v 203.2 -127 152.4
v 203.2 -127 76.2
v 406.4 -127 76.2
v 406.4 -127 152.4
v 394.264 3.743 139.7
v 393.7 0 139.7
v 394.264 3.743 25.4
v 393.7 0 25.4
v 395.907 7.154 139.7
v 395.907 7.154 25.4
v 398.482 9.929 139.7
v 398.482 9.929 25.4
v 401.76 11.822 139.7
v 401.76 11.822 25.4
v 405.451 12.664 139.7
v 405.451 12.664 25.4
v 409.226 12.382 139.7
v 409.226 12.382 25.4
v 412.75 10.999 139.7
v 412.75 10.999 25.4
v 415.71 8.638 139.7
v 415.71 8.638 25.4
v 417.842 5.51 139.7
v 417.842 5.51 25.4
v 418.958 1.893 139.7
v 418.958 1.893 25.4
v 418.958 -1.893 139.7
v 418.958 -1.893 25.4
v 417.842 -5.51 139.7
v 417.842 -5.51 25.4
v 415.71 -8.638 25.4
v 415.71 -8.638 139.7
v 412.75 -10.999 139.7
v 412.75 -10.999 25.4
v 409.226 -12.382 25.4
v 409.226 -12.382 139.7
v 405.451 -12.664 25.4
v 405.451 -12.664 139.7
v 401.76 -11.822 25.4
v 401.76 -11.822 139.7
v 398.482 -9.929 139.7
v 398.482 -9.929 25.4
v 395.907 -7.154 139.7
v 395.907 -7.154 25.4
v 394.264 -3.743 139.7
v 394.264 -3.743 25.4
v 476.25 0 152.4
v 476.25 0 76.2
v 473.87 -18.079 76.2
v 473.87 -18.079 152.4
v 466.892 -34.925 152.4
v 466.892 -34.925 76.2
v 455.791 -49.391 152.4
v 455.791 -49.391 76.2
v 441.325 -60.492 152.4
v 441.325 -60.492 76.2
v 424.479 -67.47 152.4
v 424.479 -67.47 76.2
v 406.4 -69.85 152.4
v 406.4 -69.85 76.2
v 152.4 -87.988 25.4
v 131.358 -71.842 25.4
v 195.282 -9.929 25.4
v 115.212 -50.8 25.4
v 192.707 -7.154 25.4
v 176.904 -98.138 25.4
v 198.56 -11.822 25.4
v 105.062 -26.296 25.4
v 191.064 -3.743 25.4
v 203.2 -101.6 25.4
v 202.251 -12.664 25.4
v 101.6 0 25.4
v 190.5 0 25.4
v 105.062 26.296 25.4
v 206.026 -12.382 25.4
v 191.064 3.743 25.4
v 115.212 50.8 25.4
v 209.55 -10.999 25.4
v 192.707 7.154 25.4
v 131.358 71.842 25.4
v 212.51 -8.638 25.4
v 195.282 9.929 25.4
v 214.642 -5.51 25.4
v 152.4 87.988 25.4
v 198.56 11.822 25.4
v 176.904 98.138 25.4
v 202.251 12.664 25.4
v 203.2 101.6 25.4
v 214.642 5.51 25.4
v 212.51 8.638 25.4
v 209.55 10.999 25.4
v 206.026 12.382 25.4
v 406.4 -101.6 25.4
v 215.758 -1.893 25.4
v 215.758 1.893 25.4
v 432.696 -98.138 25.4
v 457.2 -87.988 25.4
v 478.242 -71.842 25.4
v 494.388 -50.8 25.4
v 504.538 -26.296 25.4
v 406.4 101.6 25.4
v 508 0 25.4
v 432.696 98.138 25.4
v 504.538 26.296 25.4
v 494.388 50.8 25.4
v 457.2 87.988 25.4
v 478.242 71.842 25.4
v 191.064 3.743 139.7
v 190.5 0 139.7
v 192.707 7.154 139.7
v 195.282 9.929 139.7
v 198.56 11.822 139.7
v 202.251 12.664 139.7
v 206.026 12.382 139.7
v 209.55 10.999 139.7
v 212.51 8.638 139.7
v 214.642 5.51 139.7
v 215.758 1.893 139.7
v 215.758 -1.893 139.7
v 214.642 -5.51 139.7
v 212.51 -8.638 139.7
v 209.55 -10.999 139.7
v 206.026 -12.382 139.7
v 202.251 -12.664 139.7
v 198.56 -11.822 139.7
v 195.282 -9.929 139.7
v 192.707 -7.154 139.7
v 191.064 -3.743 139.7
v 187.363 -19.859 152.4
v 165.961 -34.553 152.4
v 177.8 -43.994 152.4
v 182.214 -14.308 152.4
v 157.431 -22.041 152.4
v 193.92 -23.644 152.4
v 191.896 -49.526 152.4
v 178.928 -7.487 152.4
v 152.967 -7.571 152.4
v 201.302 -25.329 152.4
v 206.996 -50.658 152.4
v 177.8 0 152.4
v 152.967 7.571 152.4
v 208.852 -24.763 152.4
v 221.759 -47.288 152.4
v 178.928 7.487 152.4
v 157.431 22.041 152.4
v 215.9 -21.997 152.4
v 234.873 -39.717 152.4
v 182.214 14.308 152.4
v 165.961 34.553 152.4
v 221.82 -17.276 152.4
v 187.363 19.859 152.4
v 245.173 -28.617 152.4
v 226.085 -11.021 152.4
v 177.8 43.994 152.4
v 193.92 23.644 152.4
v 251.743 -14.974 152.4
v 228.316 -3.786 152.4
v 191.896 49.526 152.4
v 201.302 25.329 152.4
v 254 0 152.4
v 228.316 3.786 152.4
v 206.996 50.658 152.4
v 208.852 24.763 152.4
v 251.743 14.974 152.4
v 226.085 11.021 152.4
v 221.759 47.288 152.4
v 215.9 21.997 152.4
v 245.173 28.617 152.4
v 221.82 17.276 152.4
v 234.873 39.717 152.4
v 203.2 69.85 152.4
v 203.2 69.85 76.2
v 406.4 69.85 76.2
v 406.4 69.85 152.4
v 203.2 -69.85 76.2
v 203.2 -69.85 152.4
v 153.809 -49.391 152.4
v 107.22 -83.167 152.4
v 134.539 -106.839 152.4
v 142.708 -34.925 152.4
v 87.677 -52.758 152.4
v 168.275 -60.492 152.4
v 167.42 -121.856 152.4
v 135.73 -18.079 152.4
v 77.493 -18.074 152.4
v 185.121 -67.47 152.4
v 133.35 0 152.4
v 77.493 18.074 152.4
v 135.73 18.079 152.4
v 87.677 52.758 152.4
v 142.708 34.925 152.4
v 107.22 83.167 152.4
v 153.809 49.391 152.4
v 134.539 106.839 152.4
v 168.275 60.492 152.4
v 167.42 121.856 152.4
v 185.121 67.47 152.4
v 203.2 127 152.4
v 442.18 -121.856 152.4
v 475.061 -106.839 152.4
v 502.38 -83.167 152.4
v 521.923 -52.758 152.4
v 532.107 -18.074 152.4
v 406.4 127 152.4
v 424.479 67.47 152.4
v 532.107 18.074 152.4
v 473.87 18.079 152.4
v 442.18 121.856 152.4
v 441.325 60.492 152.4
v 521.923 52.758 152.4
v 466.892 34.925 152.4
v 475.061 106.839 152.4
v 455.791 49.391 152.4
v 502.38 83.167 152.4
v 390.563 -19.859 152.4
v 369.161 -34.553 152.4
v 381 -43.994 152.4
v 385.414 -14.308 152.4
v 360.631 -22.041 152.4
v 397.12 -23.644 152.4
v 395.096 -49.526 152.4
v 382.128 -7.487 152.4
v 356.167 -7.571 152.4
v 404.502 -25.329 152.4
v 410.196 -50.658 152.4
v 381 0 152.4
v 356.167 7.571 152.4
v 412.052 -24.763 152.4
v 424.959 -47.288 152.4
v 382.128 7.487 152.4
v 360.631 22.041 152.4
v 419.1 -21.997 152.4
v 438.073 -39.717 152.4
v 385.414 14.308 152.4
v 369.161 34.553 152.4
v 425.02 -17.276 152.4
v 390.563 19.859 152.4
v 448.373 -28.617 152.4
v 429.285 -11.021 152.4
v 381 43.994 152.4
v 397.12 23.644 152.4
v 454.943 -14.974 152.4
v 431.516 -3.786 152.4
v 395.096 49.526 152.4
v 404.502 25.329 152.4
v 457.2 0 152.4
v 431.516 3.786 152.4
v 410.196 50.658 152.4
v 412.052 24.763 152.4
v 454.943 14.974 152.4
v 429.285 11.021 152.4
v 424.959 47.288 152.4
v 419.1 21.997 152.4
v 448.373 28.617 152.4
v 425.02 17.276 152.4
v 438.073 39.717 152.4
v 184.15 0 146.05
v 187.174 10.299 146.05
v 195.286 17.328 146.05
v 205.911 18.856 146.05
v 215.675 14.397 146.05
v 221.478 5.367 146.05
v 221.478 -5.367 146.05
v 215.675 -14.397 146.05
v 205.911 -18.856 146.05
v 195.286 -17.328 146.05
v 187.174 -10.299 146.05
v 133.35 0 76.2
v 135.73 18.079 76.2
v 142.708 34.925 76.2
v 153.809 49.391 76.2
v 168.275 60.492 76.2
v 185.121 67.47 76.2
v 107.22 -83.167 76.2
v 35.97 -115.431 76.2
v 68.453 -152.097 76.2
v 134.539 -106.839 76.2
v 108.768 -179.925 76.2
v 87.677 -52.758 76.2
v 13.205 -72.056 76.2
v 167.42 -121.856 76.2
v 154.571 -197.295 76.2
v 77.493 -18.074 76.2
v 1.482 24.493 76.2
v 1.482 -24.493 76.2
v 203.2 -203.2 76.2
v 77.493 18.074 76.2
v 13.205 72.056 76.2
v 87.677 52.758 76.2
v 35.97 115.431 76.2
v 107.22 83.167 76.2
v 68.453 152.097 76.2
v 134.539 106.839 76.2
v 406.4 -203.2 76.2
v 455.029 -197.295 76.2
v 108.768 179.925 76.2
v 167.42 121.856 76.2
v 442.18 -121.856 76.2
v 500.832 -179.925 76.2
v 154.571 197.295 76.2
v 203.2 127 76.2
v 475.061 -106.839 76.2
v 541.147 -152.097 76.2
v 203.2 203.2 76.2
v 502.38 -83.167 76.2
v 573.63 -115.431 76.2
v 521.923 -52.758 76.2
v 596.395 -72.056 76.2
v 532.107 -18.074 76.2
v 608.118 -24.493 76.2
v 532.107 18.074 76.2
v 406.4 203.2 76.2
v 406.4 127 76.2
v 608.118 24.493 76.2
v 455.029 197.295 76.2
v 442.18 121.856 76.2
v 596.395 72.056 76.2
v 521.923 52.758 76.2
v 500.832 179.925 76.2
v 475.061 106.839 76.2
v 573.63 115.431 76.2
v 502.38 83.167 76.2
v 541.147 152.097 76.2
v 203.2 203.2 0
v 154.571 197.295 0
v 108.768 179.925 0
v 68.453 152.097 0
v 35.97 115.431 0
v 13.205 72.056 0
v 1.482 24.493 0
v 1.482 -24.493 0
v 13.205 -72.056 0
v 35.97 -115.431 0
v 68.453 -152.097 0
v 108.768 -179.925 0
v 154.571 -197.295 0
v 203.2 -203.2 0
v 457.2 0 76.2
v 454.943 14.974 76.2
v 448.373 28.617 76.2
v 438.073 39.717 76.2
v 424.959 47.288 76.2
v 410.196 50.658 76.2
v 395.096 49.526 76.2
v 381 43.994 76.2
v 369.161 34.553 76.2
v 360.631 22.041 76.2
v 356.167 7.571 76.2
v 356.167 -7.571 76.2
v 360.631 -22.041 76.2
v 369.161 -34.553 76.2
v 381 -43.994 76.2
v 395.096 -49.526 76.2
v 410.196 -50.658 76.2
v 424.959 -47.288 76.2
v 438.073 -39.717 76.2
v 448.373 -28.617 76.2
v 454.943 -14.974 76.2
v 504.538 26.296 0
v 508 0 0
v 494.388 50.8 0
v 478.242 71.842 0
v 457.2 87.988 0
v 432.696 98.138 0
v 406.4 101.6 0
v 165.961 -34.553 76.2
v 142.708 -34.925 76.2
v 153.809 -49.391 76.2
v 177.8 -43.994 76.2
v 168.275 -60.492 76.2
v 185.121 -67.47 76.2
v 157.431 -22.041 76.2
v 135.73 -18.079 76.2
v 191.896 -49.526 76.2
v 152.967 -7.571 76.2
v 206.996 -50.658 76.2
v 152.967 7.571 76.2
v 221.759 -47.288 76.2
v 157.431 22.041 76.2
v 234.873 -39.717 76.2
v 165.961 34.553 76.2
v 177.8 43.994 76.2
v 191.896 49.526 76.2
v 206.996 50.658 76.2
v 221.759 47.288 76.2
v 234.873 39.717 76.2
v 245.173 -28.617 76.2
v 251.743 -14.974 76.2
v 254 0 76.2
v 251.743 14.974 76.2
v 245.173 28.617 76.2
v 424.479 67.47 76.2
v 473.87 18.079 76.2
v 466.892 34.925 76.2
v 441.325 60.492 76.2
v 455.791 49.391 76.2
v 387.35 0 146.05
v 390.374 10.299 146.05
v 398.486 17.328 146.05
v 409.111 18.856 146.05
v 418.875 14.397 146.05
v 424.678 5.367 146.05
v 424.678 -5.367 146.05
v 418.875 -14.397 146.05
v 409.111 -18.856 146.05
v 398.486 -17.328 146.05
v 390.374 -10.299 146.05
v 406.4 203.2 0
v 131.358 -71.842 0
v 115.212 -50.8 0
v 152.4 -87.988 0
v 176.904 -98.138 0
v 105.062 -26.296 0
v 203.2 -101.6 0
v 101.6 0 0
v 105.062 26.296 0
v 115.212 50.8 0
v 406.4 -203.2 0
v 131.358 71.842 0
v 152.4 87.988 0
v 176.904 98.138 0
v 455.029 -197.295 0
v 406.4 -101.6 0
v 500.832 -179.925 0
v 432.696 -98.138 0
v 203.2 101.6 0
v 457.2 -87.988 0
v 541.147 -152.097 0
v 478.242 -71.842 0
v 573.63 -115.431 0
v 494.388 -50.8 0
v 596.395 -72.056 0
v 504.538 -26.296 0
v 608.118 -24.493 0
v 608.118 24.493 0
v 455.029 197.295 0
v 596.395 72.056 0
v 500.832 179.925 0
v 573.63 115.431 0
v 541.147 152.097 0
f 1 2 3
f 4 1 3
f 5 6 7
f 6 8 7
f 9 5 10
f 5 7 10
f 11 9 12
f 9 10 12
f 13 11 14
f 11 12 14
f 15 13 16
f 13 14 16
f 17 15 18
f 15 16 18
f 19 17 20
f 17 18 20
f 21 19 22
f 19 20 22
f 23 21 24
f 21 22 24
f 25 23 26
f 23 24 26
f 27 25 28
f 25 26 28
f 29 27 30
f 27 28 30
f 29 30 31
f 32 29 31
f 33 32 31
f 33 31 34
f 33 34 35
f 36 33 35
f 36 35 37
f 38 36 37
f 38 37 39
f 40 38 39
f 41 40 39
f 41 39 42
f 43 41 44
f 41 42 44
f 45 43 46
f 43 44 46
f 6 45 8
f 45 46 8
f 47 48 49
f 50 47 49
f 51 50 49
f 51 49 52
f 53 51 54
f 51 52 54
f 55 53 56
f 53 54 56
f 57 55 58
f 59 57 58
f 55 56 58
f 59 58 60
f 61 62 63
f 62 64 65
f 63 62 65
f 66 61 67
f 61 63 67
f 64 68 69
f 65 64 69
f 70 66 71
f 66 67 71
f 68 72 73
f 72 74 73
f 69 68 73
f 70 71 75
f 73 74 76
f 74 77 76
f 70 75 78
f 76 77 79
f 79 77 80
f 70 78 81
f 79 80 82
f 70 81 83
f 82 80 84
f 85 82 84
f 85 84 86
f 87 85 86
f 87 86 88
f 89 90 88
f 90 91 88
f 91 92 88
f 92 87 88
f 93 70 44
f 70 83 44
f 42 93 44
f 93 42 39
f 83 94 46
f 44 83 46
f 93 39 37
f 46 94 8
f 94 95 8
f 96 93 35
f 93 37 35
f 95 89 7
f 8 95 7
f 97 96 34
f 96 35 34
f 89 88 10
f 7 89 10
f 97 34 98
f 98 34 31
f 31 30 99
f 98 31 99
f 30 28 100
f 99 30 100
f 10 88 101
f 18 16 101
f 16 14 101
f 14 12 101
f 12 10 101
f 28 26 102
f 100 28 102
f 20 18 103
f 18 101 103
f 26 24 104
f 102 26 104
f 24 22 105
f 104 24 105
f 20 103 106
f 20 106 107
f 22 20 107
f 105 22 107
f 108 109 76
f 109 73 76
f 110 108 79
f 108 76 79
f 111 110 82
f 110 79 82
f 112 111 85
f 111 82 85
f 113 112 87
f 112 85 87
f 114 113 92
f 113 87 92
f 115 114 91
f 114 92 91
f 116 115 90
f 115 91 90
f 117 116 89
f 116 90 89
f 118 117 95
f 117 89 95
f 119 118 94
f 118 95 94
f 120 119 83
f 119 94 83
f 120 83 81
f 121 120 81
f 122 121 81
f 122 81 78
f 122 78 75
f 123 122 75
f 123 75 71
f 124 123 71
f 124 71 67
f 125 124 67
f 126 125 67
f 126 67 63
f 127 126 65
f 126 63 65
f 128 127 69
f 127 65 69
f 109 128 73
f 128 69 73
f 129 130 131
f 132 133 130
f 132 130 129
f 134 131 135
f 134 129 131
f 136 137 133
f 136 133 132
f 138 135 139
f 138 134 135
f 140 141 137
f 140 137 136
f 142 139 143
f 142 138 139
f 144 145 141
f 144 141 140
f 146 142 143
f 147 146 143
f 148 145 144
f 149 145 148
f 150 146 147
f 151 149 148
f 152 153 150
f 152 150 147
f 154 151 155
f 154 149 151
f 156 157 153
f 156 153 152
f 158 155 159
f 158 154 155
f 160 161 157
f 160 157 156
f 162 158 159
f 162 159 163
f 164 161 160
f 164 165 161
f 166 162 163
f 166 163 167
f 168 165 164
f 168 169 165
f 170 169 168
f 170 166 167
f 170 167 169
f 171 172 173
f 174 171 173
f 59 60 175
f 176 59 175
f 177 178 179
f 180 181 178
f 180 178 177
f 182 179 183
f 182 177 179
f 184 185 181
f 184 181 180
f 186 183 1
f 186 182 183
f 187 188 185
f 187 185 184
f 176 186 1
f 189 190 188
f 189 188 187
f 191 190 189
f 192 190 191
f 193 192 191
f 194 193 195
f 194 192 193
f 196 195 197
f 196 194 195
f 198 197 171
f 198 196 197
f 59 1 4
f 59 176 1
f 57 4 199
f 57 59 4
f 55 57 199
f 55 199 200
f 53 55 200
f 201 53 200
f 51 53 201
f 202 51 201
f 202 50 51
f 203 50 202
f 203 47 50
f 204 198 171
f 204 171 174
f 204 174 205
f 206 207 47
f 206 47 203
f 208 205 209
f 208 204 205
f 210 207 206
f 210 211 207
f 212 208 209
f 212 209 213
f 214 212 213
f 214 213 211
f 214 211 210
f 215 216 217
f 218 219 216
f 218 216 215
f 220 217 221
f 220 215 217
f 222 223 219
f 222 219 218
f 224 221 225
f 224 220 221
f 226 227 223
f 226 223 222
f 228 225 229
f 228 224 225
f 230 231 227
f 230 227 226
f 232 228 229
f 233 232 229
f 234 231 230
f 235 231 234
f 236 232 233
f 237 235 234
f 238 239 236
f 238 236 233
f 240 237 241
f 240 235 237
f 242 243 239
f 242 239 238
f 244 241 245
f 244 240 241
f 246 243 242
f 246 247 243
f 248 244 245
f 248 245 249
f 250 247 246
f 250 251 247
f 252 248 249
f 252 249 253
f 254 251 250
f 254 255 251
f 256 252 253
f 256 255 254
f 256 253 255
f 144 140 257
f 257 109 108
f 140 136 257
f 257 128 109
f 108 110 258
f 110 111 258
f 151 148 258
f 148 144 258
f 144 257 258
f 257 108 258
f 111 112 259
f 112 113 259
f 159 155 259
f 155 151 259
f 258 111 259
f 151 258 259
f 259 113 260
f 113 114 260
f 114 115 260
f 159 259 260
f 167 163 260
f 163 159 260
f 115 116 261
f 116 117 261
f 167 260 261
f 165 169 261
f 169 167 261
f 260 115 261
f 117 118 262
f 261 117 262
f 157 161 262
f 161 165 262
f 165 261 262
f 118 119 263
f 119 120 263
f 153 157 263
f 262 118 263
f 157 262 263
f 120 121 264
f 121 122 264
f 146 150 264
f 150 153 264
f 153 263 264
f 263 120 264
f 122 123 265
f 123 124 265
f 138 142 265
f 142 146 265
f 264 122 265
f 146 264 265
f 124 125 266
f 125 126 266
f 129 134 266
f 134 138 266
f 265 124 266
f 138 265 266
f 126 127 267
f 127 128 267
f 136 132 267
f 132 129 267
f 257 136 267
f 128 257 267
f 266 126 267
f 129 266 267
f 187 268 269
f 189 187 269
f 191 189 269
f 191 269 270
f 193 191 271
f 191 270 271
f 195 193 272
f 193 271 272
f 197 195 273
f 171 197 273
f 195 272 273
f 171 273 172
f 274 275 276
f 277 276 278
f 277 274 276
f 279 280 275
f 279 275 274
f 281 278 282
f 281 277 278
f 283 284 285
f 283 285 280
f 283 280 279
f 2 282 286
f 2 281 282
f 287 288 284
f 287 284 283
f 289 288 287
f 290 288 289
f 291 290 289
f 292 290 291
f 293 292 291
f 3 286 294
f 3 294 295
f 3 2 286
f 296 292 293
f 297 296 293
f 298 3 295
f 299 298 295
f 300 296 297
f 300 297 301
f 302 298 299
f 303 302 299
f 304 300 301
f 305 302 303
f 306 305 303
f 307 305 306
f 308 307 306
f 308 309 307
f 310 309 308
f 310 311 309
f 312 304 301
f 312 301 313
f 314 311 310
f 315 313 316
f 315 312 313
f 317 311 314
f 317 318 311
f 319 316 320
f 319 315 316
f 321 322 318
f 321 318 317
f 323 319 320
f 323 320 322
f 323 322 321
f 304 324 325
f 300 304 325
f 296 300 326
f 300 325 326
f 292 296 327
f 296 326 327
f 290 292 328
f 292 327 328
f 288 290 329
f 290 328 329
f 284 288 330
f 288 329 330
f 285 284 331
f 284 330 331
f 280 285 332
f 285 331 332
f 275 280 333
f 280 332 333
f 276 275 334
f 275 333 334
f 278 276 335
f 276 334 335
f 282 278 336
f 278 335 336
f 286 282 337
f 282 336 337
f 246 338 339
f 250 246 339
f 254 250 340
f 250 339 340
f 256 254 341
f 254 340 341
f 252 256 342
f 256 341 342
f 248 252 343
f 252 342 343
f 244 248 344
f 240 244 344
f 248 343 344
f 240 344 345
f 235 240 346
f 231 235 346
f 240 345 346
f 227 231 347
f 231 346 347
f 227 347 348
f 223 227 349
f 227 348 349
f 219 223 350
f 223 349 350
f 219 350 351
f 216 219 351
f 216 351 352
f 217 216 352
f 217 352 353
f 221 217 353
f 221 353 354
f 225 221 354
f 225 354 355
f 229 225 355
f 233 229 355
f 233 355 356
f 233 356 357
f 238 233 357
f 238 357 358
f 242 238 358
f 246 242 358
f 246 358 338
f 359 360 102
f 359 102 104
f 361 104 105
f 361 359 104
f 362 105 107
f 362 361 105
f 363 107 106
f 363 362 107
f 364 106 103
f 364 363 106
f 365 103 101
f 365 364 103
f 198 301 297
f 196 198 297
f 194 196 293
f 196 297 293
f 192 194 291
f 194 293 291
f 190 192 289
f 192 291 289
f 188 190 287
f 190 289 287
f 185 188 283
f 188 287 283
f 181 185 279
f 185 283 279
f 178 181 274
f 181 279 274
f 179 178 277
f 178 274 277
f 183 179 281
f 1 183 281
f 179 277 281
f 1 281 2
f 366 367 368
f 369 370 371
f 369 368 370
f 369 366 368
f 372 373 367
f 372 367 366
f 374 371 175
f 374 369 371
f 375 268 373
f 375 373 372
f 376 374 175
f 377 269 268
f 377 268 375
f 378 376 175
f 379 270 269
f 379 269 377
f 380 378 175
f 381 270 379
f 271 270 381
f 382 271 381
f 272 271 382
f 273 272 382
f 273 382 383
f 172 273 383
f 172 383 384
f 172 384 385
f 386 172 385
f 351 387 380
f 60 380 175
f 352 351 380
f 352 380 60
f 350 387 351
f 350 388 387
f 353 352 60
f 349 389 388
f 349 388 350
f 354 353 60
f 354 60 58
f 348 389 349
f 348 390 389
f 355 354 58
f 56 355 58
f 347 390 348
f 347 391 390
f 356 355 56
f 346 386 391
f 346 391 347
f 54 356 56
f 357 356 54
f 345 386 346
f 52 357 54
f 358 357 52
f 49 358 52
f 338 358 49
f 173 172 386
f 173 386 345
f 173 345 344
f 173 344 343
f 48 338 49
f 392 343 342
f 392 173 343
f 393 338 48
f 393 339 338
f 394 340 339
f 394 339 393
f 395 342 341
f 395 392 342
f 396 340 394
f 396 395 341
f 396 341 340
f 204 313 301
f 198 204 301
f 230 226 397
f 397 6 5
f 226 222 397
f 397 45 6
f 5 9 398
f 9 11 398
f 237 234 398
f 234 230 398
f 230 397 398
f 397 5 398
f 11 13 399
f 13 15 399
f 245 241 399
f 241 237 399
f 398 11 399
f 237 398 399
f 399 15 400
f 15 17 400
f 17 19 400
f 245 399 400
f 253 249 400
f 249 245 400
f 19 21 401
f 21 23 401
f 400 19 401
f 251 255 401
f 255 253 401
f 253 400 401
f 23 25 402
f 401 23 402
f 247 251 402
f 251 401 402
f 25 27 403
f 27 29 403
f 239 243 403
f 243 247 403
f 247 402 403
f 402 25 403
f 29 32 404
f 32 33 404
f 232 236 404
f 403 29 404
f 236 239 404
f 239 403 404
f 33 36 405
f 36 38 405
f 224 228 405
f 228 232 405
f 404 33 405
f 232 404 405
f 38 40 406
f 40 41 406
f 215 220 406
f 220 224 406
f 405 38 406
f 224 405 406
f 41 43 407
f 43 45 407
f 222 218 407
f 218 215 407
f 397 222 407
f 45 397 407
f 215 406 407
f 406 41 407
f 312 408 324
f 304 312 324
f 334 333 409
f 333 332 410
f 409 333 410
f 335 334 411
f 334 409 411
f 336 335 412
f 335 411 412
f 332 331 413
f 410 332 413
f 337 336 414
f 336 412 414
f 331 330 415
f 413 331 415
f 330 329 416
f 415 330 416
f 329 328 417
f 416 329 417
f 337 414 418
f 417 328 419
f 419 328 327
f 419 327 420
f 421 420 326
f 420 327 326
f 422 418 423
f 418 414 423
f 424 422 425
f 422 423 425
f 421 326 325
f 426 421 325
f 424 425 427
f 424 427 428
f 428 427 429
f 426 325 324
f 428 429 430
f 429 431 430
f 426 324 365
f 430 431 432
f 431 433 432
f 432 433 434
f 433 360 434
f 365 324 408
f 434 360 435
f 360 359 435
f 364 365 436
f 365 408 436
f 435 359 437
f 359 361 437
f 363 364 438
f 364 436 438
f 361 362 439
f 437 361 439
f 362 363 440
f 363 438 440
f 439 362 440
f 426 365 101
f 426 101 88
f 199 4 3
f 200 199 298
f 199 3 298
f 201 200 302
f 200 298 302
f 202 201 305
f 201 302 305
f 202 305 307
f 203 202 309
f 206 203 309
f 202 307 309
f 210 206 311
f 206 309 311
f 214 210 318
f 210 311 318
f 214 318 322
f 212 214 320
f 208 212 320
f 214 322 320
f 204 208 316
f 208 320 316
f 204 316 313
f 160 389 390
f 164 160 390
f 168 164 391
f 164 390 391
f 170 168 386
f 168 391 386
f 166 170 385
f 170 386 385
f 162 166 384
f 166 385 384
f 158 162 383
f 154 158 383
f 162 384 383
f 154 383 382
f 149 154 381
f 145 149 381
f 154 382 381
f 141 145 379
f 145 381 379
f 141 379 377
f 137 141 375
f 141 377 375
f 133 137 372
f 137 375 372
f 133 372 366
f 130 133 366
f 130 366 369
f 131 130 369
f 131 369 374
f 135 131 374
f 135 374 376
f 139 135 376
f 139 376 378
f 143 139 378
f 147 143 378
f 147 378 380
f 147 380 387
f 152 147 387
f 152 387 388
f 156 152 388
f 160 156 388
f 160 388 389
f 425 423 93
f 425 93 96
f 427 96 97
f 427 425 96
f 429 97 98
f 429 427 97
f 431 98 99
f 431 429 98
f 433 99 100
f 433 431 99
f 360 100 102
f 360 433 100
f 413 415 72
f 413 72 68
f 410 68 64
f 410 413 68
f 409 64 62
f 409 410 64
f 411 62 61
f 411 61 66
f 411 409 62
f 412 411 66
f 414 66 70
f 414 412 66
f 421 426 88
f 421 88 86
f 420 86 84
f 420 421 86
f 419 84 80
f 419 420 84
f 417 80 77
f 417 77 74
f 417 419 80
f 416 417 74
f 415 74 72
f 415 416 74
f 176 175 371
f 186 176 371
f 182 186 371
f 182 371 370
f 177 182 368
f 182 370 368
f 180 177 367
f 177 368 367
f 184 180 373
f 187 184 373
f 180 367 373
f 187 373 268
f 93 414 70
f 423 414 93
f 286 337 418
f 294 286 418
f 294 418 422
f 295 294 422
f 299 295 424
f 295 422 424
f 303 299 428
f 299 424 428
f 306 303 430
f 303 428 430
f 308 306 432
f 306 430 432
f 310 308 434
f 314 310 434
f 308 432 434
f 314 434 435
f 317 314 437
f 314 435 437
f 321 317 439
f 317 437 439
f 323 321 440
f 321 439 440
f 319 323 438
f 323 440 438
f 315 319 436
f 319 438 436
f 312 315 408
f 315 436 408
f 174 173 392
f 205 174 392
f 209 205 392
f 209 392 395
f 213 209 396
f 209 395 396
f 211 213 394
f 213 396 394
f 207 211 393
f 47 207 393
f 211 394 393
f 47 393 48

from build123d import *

# Parameters (mm, degrees)
F0_R           = 50.8
F0_R_2         = 12.7
F1_DEPTH       = 76.2
F2_DEPTH       = 152.4
F3_DEPTH       = 152.4
F4_DEPTH       = 25.4
F5_START       = 25.4
F5_DEPTH       = 127
F7_D           = 25.4
F7_CSINK_D     = 50.8
F7_CSINK_ANGLE = 90


# Not quite as in the source:
# - a feature names something its author has since deleted; it is built from what else it names


with BuildPart() as f1:
    # F0 (on Top) → F1 (new body)
    with BuildSketch(Plane.XY):
        with BuildLine():
            ThreePointArc((0, 0), (59.5159020629, -143.6840979371), (203.2, -203.2))
            Line((203.2, -203.2), (406.4, -203.2))
            ThreePointArc((406.4, -203.2), (550.0840979371, -143.6840979371), (609.6, 0))
            ThreePointArc((609.6, 0), (550.0840979371, 143.6840979371), (406.4, 203.2))
            Line((406.4, 203.2), (203.2, 203.2))
            ThreePointArc((203.2, 203.2), (59.5159020629, 143.6840979371), (0, 0))
        make_face()
        with BuildLine():
            Line((406.4, -127), (203.2, -127))
            ThreePointArc((203.2, -127), (113.3974387893, -89.8025612107), (76.2, 0))
            ThreePointArc((76.2, 0), (113.3974387893, 89.8025612107), (203.2, 127))
            Line((203.2, 127), (406.4, 127))
            ThreePointArc((406.4, 127), (496.2025612107, 89.8025612107), (533.4, 0))
            ThreePointArc((533.4, 0), (496.2025612107, -89.8025612107), (406.4, -127))
        make_face(mode=Mode.SUBTRACT)
        with BuildLine():
            ThreePointArc((76.2, 0), (113.3974387893, -89.8025612107), (203.2, -127))
            Line((203.2, -127), (406.4, -127))
            ThreePointArc((406.4, -127), (496.2025612107, -89.8025612107), (533.4, 0))
            ThreePointArc((533.4, 0), (496.2025612107, 89.8025612107), (406.4, 127))
            Line((406.4, 127), (203.2, 127))
            ThreePointArc((203.2, 127), (113.3974387893, 89.8025612107), (76.2, 0))
        make_face()
        with BuildLine():
            Line((406.4, -101.6), (203.2, -101.6))
            ThreePointArc((203.2, -101.6), (131.3579510314, -71.8420489686), (101.6, 0))
            ThreePointArc((101.6, 0), (131.3579510314, 71.8420489686), (203.2, 101.6))
            Line((203.2, 101.6), (406.4, 101.6))
            ThreePointArc((406.4, 101.6), (478.2420489686, 71.8420489686), (508, 0))
            ThreePointArc((508, 0), (478.2420489686, -71.8420489686), (406.4, -101.6))
        make_face(mode=Mode.SUBTRACT)
        with BuildLine():
            ThreePointArc((101.6, 0), (131.3579510314, -71.8420489686), (203.2, -101.6))
            Line((203.2, -101.6), (406.4, -101.6))
            ThreePointArc((406.4, -101.6), (478.2420489686, -71.8420489686), (508, 0))
            ThreePointArc((508, 0), (478.2420489686, 71.8420489686), (406.4, 101.6))
            Line((406.4, 101.6), (203.2, 101.6))
            ThreePointArc((203.2, 101.6), (131.3579510314, 71.8420489686), (101.6, 0))
        make_face()
        with BuildLine():
            ThreePointArc((476.25, 0), (455.7914086659, -49.3914086659), (406.4, -69.85))
            Line((406.4, -69.85), (203.2, -69.85))
            ThreePointArc((203.2, -69.85), (153.8085913341, -49.3914086659), (133.35, 0))
            ThreePointArc((133.35, 0), (153.8085913341, 49.3914086659), (203.2, 69.85))
            Line((203.2, 69.85), (406.4, 69.85))
            ThreePointArc((406.4, 69.85), (455.7914086659, 49.3914086659), (476.25, 0))
        make_face(mode=Mode.SUBTRACT)
        with BuildLine():
            Line((203.2, -69.85), (406.4, -69.85))
            ThreePointArc((406.4, -69.85), (455.7914086659, -49.3914086659), (476.25, 0))
            ThreePointArc((476.25, 0), (455.7914086659, 49.3914086659), (406.4, 69.85))
            Line((406.4, 69.85), (203.2, 69.85))
            ThreePointArc((203.2, 69.85), (153.8085913341, 49.3914086659), (133.35, 0))
            ThreePointArc((133.35, 0), (153.8085913341, -49.3914086659), (203.2, -69.85))
        make_face()
        with Locations((203.2, 0)):
            Circle(F0_R, mode=Mode.SUBTRACT)
        with Locations((406.4, 0)):
            Circle(F0_R, mode=Mode.SUBTRACT)
        with Locations((406.4, 0)):
            Circle(F0_R)
        with Locations((406.4, 0)):
            Circle(F0_R_2, mode=Mode.SUBTRACT)
        with Locations((203.2, 0)):
            Circle(F0_R)
        with Locations((203.2, 0)):
            Circle(F0_R_2, mode=Mode.SUBTRACT)
    extrude(amount=F1_DEPTH)

    # F0 (on Top) → F2 (join)
    with BuildSketch(Plane.XY):
        with BuildLine():
            ThreePointArc((76.2, 0), (113.3974387893, -89.8025612107), (203.2, -127))
            Line((203.2, -127), (406.4, -127))
            ThreePointArc((406.4, -127), (496.2025612107, -89.8025612107), (533.4, 0))
            ThreePointArc((533.4, 0), (496.2025612107, 89.8025612107), (406.4, 127))
            Line((406.4, 127), (203.2, 127))
            ThreePointArc((203.2, 127), (113.3974387893, 89.8025612107), (76.2, 0))
        make_face()
        with BuildLine():
            Line((406.4, -101.6), (203.2, -101.6))
            ThreePointArc((203.2, -101.6), (131.3579510314, -71.8420489686), (101.6, 0))
            ThreePointArc((101.6, 0), (131.3579510314, 71.8420489686), (203.2, 101.6))
            Line((203.2, 101.6), (406.4, 101.6))
            ThreePointArc((406.4, 101.6), (478.2420489686, 71.8420489686), (508, 0))
            ThreePointArc((508, 0), (478.2420489686, -71.8420489686), (406.4, -101.6))
        make_face(mode=Mode.SUBTRACT)
    extrude(amount=F2_DEPTH)

    # F0 (on Top) → F3 (join)
    with BuildSketch(Plane.XY):
        with Locations((203.2, 0)):
            Circle(F0_R)
        with Locations((203.2, 0)):
            Circle(F0_R_2, mode=Mode.SUBTRACT)
        with Locations((406.4, 0)):
            Circle(F0_R)
        with Locations((406.4, 0)):
            Circle(F0_R_2, mode=Mode.SUBTRACT)
        with Locations((203.2, 0)):
            Circle(F0_R_2)
        with Locations((406.4, 0)):
            Circle(F0_R_2)
    extrude(amount=F3_DEPTH)

    # F0 (on Top) → F4 (cut)
    with BuildSketch(Plane.XY):
        with BuildLine():
            ThreePointArc((101.6, 0), (131.3579510314, -71.8420489686), (203.2, -101.6))
            Line((203.2, -101.6), (406.4, -101.6))
            ThreePointArc((406.4, -101.6), (478.2420489686, -71.8420489686), (508, 0))
            ThreePointArc((508, 0), (478.2420489686, 71.8420489686), (406.4, 101.6))
            Line((406.4, 101.6), (203.2, 101.6))
            ThreePointArc((203.2, 101.6), (131.3579510314, 71.8420489686), (101.6, 0))
        make_face()
        with BuildLine():
            ThreePointArc((476.25, 0), (455.7914086659, -49.3914086659), (406.4, -69.85))
            Line((406.4, -69.85), (203.2, -69.85))
            ThreePointArc((203.2, -69.85), (153.8085913341, -49.3914086659), (133.35, 0))
            ThreePointArc((133.35, 0), (153.8085913341, 49.3914086659), (203.2, 69.85))
            Line((203.2, 69.85), (406.4, 69.85))
            ThreePointArc((406.4, 69.85), (455.7914086659, 49.3914086659), (476.25, 0))
        make_face(mode=Mode.SUBTRACT)
        with BuildLine():
            Line((203.2, -69.85), (406.4, -69.85))
            ThreePointArc((406.4, -69.85), (455.7914086659, -49.3914086659), (476.25, 0))
            ThreePointArc((476.25, 0), (455.7914086659, 49.3914086659), (406.4, 69.85))
            Line((406.4, 69.85), (203.2, 69.85))
            ThreePointArc((203.2, 69.85), (153.8085913341, 49.3914086659), (133.35, 0))
            ThreePointArc((133.35, 0), (153.8085913341, -49.3914086659), (203.2, -69.85))
        make_face()
        with Locations((203.2, 0)):
            Circle(F0_R, mode=Mode.SUBTRACT)
        with Locations((406.4, 0)):
            Circle(F0_R, mode=Mode.SUBTRACT)
        with Locations((203.2, 0)):
            Circle(F0_R)
        with Locations((203.2, 0)):
            Circle(F0_R_2, mode=Mode.SUBTRACT)
        with Locations((406.4, 0)):
            Circle(F0_R)
        with Locations((406.4, 0)):
            Circle(F0_R_2, mode=Mode.SUBTRACT)
    extrude(amount=F4_DEPTH, mode=Mode.SUBTRACT)

    # F0 (on Top) → F5 (join)
    with BuildSketch(Plane.XY.offset(F5_START)):
        with BuildLine():
            ThreePointArc((101.6, 0), (131.3579510314, -71.8420489686), (203.2, -101.6))
            Line((203.2, -101.6), (406.4, -101.6))
            ThreePointArc((406.4, -101.6), (478.2420489686, -71.8420489686), (508, 0))
            ThreePointArc((508, 0), (478.2420489686, 71.8420489686), (406.4, 101.6))
            Line((406.4, 101.6), (203.2, 101.6))
            ThreePointArc((203.2, 101.6), (131.3579510314, 71.8420489686), (101.6, 0))
        make_face()
        with BuildLine():
            ThreePointArc((476.25, 0), (455.7914086659, -49.3914086659), (406.4, -69.85))
            Line((406.4, -69.85), (203.2, -69.85))
            ThreePointArc((203.2, -69.85), (153.8085913341, -49.3914086659), (133.35, 0))
            ThreePointArc((133.35, 0), (153.8085913341, 49.3914086659), (203.2, 69.85))
            Line((203.2, 69.85), (406.4, 69.85))
            ThreePointArc((406.4, 69.85), (455.7914086659, 49.3914086659), (476.25, 0))
        make_face(mode=Mode.SUBTRACT)
    extrude(amount=F5_DEPTH)

    # F7 (through all)
    with Locations(Plane.XY.offset(152.4)):
        with Locations((203.2, 0), (406.4, 0)):
            CounterSinkHole(F7_D / 2, F7_CSINK_D / 2, counter_sink_angle=F7_CSINK_ANGLE)


solid = f1.part
